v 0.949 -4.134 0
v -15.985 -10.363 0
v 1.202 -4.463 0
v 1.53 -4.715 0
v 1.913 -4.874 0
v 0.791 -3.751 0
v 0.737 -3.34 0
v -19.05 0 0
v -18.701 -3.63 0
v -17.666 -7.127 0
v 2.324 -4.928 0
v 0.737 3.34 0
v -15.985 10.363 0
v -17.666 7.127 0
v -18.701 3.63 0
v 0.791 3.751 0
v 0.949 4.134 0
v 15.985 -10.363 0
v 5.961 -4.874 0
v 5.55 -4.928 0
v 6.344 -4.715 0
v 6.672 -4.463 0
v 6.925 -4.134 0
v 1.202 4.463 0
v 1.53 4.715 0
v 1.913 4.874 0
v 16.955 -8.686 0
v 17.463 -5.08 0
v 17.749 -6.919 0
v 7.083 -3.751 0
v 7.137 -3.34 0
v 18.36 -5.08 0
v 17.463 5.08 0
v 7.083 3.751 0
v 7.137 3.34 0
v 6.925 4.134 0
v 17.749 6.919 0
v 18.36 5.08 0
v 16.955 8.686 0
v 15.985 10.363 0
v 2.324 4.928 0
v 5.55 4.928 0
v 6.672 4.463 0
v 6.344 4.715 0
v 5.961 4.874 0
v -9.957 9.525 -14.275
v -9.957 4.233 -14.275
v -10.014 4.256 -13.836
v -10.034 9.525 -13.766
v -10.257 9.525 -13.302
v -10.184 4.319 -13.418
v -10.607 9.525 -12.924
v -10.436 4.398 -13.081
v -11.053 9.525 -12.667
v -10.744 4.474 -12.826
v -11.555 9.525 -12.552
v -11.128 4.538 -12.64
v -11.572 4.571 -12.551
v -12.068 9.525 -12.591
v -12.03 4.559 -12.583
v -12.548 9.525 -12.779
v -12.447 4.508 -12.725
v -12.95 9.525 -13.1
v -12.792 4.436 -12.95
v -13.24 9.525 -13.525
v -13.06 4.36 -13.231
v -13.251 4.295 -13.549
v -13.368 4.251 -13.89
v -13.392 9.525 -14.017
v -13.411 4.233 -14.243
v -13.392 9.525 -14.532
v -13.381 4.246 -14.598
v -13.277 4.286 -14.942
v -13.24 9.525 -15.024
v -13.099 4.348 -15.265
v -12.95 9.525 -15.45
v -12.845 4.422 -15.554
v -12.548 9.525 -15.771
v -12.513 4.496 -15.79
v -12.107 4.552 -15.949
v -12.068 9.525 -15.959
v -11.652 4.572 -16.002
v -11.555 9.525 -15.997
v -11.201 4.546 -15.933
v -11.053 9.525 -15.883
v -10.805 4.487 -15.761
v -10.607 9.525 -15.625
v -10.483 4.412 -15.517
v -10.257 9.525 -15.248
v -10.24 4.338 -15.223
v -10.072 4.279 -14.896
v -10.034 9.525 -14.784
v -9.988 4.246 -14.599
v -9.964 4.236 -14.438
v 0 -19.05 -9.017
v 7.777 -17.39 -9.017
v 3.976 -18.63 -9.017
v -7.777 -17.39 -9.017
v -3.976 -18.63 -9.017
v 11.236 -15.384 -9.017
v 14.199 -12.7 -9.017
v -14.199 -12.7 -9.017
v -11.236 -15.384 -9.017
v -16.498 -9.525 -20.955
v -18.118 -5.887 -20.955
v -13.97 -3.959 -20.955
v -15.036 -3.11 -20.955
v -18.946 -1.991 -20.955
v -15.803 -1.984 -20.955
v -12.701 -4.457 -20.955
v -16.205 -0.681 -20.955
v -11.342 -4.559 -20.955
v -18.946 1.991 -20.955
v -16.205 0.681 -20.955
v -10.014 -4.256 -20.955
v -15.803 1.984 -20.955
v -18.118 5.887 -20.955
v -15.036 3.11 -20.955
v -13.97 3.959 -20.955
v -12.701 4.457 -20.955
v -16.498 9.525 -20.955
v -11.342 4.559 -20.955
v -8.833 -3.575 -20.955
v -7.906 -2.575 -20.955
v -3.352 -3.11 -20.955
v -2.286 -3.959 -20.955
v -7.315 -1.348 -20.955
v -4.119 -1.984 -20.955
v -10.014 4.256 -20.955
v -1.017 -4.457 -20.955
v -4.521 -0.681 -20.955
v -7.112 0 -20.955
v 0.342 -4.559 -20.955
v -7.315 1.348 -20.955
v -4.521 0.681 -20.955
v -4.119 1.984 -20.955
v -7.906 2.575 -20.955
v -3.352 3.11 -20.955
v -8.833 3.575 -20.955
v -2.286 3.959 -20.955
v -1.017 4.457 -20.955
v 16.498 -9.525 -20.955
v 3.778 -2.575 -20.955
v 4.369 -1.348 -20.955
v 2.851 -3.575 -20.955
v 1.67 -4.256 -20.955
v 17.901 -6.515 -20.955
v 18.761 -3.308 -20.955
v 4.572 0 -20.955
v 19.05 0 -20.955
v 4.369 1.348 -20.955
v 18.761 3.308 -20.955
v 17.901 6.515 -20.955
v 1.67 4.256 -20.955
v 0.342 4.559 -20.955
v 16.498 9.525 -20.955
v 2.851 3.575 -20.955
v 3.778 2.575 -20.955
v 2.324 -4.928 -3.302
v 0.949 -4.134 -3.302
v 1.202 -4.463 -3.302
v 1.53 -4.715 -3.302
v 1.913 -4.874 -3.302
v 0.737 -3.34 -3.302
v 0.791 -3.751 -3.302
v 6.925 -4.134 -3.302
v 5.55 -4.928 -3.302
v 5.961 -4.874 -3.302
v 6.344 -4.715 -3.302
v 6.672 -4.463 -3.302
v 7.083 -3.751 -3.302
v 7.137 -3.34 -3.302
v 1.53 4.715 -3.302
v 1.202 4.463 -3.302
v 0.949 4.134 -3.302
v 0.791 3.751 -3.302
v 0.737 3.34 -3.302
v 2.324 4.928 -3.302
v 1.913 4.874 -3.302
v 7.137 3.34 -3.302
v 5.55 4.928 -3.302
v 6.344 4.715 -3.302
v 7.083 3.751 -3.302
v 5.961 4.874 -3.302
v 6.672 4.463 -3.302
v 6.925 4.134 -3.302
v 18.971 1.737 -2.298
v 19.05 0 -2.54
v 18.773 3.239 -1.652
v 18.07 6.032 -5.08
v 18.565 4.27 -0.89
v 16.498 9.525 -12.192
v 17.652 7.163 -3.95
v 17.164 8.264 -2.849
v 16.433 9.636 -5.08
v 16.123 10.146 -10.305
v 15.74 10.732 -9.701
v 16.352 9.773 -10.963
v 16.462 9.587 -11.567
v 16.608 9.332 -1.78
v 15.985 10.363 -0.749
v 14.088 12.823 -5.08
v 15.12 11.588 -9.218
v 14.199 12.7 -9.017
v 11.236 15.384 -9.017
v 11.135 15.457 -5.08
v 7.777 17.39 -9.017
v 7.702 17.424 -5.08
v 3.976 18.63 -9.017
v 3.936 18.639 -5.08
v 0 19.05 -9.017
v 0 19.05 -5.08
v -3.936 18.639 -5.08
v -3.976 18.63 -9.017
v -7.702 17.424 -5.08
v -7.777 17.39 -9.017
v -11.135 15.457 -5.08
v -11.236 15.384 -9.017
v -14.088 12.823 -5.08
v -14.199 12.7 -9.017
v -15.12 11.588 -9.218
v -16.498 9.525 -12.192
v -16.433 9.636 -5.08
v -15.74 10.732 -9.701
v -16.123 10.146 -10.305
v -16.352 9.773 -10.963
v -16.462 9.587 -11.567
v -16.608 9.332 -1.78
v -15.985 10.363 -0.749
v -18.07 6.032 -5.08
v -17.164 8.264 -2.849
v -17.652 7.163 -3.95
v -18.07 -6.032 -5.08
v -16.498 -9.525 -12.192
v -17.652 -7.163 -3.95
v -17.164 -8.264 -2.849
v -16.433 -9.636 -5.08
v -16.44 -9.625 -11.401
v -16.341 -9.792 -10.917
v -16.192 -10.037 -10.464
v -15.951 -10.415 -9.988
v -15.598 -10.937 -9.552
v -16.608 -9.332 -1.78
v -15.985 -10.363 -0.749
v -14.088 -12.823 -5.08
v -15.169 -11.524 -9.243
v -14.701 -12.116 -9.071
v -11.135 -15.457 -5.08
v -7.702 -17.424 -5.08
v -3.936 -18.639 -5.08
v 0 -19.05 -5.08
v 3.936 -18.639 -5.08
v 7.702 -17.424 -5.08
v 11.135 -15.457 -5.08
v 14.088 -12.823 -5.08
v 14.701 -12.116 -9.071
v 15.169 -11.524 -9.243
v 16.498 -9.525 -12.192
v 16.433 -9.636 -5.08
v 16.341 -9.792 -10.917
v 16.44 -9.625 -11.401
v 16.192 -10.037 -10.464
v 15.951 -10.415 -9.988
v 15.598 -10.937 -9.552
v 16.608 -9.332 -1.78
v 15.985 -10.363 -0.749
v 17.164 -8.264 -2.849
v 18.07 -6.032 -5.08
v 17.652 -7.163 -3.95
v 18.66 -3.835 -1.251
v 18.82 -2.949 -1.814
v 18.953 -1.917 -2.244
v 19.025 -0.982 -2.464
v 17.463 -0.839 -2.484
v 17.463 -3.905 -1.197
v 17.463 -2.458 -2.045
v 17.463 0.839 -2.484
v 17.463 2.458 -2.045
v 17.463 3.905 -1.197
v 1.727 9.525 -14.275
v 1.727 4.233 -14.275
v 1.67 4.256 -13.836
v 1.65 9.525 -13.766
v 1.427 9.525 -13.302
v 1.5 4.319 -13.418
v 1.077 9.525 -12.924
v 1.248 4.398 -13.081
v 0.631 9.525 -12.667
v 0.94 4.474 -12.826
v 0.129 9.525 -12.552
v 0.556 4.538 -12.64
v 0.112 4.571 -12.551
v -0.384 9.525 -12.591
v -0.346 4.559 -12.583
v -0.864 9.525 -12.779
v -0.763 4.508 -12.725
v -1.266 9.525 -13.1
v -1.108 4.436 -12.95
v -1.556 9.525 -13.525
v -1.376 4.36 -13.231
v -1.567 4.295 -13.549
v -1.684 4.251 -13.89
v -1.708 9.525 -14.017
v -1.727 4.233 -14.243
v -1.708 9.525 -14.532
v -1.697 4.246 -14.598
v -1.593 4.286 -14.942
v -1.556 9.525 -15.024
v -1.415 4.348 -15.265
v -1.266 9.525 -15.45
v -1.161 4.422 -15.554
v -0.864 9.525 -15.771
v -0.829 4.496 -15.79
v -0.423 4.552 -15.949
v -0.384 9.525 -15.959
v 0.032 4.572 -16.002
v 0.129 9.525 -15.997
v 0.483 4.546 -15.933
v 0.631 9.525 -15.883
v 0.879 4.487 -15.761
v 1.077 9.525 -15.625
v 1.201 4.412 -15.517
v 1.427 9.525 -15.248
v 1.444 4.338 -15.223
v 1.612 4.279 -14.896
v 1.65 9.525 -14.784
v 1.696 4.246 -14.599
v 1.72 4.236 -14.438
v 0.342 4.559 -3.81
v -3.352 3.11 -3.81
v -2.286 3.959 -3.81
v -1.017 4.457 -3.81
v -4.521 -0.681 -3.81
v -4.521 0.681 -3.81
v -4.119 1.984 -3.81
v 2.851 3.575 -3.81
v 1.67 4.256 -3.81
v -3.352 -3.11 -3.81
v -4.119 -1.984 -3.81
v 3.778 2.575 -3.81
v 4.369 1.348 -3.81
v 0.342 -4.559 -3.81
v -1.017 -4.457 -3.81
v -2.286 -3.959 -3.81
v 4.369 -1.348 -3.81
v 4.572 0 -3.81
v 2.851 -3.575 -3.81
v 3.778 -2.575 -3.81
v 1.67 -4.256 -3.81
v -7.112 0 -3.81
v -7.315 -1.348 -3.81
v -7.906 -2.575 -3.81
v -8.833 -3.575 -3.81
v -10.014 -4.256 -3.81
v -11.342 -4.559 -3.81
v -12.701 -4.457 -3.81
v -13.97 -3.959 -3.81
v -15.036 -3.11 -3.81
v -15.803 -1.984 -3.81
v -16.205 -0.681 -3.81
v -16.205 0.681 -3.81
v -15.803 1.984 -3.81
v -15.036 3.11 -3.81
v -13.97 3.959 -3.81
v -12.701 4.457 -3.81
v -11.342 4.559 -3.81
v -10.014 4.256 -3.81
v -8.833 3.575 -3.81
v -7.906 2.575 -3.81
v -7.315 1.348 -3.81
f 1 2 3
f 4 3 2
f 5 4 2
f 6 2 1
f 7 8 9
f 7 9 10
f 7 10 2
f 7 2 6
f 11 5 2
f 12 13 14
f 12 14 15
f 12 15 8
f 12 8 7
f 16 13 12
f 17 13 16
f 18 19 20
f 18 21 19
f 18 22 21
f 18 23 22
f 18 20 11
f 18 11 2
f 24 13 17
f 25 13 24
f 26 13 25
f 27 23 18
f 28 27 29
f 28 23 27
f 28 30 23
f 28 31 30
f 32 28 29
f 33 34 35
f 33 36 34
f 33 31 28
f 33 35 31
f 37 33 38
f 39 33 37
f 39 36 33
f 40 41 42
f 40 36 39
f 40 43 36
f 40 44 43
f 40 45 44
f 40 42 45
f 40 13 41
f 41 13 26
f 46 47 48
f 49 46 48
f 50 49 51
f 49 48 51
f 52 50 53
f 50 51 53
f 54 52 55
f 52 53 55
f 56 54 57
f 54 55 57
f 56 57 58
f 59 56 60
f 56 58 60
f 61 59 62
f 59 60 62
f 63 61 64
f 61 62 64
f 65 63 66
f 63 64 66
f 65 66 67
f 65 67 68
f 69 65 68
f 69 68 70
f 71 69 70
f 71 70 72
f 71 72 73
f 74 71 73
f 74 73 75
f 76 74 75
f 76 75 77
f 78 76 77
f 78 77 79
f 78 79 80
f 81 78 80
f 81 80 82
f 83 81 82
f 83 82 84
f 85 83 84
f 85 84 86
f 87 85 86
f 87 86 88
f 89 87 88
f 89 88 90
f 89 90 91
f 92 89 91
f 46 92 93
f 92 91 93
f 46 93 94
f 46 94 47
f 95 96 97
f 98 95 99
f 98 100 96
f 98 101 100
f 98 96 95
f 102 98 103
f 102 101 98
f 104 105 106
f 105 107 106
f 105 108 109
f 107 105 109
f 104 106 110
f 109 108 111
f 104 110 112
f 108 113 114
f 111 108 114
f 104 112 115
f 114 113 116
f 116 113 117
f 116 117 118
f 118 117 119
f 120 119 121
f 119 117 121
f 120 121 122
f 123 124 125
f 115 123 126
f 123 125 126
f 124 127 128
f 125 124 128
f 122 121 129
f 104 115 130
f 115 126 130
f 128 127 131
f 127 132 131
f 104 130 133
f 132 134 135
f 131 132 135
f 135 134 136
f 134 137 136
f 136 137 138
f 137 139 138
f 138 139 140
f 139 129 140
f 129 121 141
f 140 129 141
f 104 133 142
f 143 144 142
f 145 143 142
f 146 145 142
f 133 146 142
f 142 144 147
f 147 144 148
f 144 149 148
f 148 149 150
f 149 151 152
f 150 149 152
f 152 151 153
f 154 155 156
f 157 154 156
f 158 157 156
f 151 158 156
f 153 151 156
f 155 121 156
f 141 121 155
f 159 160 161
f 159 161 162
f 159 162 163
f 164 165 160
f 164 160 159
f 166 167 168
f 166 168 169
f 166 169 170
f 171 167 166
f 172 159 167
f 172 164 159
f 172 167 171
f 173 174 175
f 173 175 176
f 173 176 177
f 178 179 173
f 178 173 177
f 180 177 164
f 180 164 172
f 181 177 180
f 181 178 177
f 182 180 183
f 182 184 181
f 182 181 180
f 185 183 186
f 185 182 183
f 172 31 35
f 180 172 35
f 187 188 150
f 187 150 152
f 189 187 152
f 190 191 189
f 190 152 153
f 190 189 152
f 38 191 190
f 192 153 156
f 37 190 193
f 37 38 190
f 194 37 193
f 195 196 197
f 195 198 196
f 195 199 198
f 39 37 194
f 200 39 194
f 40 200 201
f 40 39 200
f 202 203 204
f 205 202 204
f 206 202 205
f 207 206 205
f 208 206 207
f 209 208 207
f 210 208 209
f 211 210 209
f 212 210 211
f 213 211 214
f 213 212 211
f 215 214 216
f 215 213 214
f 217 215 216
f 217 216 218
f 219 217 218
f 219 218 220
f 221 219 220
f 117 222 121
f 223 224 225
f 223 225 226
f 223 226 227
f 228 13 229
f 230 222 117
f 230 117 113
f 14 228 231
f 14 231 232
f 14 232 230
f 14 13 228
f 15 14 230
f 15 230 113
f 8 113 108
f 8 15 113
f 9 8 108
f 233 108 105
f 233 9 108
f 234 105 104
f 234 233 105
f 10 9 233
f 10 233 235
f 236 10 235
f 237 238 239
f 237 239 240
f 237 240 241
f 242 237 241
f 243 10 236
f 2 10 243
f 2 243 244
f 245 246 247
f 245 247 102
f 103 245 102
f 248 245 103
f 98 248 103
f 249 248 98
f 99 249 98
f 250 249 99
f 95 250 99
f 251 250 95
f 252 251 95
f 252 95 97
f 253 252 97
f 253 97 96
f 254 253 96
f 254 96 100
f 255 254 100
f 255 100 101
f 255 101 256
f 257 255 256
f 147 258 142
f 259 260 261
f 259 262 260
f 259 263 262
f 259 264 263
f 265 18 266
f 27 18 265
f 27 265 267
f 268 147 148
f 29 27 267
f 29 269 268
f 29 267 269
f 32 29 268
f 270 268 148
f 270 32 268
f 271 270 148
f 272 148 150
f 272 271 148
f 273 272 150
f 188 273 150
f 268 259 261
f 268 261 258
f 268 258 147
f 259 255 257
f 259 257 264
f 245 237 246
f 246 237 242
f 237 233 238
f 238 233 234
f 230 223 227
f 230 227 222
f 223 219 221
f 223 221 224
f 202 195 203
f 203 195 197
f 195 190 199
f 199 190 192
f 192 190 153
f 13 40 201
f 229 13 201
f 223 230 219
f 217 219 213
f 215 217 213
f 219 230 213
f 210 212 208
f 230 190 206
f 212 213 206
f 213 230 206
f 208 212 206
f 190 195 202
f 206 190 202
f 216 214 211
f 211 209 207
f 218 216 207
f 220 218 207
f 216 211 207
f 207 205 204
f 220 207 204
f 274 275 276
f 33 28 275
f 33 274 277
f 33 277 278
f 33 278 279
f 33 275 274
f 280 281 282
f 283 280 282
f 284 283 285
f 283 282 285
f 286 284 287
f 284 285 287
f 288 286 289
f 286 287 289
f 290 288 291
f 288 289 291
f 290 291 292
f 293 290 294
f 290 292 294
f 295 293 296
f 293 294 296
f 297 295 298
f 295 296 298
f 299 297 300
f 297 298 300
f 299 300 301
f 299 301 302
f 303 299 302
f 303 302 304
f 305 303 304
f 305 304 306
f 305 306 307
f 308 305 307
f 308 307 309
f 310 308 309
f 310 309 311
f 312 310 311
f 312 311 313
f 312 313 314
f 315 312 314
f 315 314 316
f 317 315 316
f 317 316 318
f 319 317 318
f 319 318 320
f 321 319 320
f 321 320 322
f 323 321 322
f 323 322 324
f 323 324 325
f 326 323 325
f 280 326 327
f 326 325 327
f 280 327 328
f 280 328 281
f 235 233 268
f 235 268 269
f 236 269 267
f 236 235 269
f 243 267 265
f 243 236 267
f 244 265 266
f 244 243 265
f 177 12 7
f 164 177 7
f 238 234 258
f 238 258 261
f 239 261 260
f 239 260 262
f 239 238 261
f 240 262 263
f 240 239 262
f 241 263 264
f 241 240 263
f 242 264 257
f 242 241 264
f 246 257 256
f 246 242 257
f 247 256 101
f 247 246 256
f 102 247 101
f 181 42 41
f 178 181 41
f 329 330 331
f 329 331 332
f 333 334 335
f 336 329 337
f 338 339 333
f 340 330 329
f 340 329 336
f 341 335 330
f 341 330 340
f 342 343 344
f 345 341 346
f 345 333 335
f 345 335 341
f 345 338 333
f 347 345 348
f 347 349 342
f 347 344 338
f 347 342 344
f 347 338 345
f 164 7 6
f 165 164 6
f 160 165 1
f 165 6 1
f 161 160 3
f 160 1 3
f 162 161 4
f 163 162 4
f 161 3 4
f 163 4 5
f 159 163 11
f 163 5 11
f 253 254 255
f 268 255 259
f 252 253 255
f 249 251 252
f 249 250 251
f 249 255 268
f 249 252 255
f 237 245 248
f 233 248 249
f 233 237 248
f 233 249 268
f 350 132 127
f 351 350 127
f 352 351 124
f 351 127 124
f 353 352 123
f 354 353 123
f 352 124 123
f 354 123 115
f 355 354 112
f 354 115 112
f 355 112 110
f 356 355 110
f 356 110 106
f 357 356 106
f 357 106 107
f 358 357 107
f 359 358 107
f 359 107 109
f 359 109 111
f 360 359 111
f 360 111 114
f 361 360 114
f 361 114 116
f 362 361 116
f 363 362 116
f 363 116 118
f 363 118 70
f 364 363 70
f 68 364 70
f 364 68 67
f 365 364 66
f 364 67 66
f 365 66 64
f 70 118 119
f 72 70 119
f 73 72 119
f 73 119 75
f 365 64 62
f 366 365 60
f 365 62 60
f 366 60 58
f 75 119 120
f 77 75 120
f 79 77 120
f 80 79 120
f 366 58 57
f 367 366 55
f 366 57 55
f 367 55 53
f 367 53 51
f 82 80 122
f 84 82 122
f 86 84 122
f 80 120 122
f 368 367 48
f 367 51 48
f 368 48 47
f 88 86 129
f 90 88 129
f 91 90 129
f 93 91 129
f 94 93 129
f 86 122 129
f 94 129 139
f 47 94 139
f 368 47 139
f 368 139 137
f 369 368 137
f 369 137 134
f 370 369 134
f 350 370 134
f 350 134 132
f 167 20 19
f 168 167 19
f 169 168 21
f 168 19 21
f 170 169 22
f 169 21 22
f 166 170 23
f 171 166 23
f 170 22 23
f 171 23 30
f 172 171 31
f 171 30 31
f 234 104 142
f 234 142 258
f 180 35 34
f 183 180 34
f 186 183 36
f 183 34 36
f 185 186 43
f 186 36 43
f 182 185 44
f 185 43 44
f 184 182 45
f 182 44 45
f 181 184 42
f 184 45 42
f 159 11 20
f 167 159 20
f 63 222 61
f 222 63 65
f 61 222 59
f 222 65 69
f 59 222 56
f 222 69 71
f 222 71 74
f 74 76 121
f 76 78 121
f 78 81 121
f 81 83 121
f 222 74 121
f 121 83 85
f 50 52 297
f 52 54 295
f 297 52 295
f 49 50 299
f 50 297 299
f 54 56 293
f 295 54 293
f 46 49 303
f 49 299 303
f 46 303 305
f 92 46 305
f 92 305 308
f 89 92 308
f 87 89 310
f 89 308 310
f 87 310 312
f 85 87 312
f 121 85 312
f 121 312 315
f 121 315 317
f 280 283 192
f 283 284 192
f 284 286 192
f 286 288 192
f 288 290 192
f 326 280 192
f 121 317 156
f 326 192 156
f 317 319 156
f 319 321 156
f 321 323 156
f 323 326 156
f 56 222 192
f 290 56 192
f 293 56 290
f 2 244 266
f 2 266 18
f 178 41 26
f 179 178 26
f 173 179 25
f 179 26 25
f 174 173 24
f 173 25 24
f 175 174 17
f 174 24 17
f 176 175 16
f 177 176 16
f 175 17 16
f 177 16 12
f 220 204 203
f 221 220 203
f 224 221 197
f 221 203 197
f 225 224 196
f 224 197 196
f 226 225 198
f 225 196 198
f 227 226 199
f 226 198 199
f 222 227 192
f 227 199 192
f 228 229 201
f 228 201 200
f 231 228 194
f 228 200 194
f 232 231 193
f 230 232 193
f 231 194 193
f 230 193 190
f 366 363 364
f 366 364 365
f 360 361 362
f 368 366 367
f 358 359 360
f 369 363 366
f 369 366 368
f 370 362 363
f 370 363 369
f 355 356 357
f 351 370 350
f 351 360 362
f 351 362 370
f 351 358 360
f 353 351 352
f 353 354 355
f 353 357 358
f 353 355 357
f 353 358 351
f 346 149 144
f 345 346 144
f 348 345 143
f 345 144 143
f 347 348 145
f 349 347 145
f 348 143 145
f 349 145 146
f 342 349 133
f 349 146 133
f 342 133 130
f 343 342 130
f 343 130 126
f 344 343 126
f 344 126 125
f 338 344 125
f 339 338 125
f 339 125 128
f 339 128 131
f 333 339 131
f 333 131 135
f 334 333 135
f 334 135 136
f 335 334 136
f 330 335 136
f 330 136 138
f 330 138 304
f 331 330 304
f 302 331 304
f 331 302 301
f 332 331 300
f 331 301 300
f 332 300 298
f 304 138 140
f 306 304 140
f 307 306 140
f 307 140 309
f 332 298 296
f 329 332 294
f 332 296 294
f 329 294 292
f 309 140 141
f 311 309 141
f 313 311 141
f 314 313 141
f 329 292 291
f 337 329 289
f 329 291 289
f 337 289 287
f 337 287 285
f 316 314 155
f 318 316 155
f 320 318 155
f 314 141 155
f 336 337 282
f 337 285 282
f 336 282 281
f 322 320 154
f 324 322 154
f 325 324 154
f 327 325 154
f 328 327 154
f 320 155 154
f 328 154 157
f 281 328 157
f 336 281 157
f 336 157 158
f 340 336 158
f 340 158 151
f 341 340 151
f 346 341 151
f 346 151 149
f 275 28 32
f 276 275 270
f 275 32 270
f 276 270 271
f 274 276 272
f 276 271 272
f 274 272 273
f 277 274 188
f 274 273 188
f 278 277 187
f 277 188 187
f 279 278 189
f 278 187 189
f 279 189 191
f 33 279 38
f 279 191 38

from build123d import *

# Parameters (mm, degrees)
F0_R      = 19.05
F1_DEPTH  = 20.955
F3_DEPTH  = 25.4
F5_DEPTH  = 25.4
F6_R      = 4.572
F7_DEPTH  = 17.145
F9_D      = 3.4544
F9_DEPTH  = 10.81405
F9_TIP    = 1.0378064612
F11_R     = 6.35
F12_DEPTH = 1.5875
F14_DEPTH = 3.302


# Not quite as in the source:
# - a feature names something its author has since deleted; it is built from what else it names


with BuildPart() as f1:
    # F0 (on Top) → F1 (new body)
    with BuildSketch(Plane.XY):
        Circle(F0_R)
    extrude(amount=-F1_DEPTH)

    # F2 (on Right) → F3 (cut, symmetric)
    with BuildSketch(Plane.YZ):
        Polygon((-10.3632, -0.7493), (-10.3632, 0), (-19.05, 0), (-19.05, -5.08), (-6.0325, -5.08), align=None)
        Polygon((10.3632, -0.7493), (6.0325, -5.08), (19.05, -5.08), (19.05, 0), (10.3632, 0), align=None)
    extrude(amount=F3_DEPTH, both=True, mode=Mode.SUBTRACT)

    # F4 (on Right) → F5 (cut, symmetric)
    with BuildSketch(Plane.YZ):
        with BuildLine():
            Line((-19.05, -20.955), (-9.525, -20.955))
            Line((-9.525, -20.955), (-9.525, -12.192))
            ThreePointArc((-9.525, -12.192), (-10.4549359697, -9.9469359697), (-12.7, -9.017))
            Line((-12.7, -9.017), (-19.05, -9.017))
            Line((-19.05, -9.017), (-19.05, -20.955))
        make_face()
        with BuildLine():
            Line((19.05, -9.017), (12.7, -9.017))
            ThreePointArc((12.7, -9.017), (10.4549359697, -9.9469359697), (9.525, -12.192))
            Line((9.525, -12.192), (9.525, -20.955))
            Line((9.525, -20.955), (19.05, -20.955))
            Line((19.05, -20.955), (19.05, -9.017))
        make_face()
    extrude(amount=F5_DEPTH, both=True, mode=Mode.SUBTRACT)

    # F6 (on face) → F7 (cut)
    with BuildSketch(Plane(origin=(0, 0, -20.955), x_dir=(1, 0, 0), z_dir=(0, 0, -1))):
        Circle(F6_R)
        with Locations((-11.684, 0)):
            Circle(F6_R)
    extrude(amount=-F7_DEPTH, mode=Mode.SUBTRACT)

    # F9
    with Locations(Plane(origin=(0, 9.525, 0), x_dir=(-1, 0, 0), z_dir=(0, 1, 0))):
        with Locations((0, -14.2748), (11.684, -14.2748)):
            Hole(F9_D / 2, depth=F9_DEPTH)
            with Locations((0, 0, -(F9_DEPTH + F9_TIP / 2))):  # 118° drill point
                Cone(0, F9_D / 2, F9_TIP, mode=Mode.SUBTRACT)

    # F11 (on offset) → F12 (cut)
    with BuildSketch(Plane.YZ.offset(19.05)):
        with Locations((0, 3.81)):
            Circle(F11_R)
    extrude(amount=-F12_DEPTH, mode=Mode.SUBTRACT)

    # F13 (on face) → F14 (cut)
    with BuildSketch(Plane.XY):
        with BuildLine():
            Line((5.5499, 4.9276), (2.3241, 4.9276))
            ThreePointArc((2.3241, 4.9276), (1.2015679849, 4.4626320151), (0.7366, 3.3401))
            Line((0.7366, 3.3401), (0.7366, -3.3401))
            ThreePointArc((0.7366, -3.3401), (1.2015679849, -4.4626320151), (2.3241, -4.9276))
            Line((2.3241, -4.9276), (5.5499, -4.9276))
            ThreePointArc((5.5499, -4.9276), (6.6724320151, -4.4626320151), (7.1374, -3.3401))
            Line((7.1374, -3.3401), (7.1374, 3.3401))
            ThreePointArc((7.1374, 3.3401), (6.6724320151, 4.4626320151), (5.5499, 4.9276))
        make_face()
    extrude(amount=-F14_DEPTH, mode=Mode.SUBTRACT)


solid = f1.part
